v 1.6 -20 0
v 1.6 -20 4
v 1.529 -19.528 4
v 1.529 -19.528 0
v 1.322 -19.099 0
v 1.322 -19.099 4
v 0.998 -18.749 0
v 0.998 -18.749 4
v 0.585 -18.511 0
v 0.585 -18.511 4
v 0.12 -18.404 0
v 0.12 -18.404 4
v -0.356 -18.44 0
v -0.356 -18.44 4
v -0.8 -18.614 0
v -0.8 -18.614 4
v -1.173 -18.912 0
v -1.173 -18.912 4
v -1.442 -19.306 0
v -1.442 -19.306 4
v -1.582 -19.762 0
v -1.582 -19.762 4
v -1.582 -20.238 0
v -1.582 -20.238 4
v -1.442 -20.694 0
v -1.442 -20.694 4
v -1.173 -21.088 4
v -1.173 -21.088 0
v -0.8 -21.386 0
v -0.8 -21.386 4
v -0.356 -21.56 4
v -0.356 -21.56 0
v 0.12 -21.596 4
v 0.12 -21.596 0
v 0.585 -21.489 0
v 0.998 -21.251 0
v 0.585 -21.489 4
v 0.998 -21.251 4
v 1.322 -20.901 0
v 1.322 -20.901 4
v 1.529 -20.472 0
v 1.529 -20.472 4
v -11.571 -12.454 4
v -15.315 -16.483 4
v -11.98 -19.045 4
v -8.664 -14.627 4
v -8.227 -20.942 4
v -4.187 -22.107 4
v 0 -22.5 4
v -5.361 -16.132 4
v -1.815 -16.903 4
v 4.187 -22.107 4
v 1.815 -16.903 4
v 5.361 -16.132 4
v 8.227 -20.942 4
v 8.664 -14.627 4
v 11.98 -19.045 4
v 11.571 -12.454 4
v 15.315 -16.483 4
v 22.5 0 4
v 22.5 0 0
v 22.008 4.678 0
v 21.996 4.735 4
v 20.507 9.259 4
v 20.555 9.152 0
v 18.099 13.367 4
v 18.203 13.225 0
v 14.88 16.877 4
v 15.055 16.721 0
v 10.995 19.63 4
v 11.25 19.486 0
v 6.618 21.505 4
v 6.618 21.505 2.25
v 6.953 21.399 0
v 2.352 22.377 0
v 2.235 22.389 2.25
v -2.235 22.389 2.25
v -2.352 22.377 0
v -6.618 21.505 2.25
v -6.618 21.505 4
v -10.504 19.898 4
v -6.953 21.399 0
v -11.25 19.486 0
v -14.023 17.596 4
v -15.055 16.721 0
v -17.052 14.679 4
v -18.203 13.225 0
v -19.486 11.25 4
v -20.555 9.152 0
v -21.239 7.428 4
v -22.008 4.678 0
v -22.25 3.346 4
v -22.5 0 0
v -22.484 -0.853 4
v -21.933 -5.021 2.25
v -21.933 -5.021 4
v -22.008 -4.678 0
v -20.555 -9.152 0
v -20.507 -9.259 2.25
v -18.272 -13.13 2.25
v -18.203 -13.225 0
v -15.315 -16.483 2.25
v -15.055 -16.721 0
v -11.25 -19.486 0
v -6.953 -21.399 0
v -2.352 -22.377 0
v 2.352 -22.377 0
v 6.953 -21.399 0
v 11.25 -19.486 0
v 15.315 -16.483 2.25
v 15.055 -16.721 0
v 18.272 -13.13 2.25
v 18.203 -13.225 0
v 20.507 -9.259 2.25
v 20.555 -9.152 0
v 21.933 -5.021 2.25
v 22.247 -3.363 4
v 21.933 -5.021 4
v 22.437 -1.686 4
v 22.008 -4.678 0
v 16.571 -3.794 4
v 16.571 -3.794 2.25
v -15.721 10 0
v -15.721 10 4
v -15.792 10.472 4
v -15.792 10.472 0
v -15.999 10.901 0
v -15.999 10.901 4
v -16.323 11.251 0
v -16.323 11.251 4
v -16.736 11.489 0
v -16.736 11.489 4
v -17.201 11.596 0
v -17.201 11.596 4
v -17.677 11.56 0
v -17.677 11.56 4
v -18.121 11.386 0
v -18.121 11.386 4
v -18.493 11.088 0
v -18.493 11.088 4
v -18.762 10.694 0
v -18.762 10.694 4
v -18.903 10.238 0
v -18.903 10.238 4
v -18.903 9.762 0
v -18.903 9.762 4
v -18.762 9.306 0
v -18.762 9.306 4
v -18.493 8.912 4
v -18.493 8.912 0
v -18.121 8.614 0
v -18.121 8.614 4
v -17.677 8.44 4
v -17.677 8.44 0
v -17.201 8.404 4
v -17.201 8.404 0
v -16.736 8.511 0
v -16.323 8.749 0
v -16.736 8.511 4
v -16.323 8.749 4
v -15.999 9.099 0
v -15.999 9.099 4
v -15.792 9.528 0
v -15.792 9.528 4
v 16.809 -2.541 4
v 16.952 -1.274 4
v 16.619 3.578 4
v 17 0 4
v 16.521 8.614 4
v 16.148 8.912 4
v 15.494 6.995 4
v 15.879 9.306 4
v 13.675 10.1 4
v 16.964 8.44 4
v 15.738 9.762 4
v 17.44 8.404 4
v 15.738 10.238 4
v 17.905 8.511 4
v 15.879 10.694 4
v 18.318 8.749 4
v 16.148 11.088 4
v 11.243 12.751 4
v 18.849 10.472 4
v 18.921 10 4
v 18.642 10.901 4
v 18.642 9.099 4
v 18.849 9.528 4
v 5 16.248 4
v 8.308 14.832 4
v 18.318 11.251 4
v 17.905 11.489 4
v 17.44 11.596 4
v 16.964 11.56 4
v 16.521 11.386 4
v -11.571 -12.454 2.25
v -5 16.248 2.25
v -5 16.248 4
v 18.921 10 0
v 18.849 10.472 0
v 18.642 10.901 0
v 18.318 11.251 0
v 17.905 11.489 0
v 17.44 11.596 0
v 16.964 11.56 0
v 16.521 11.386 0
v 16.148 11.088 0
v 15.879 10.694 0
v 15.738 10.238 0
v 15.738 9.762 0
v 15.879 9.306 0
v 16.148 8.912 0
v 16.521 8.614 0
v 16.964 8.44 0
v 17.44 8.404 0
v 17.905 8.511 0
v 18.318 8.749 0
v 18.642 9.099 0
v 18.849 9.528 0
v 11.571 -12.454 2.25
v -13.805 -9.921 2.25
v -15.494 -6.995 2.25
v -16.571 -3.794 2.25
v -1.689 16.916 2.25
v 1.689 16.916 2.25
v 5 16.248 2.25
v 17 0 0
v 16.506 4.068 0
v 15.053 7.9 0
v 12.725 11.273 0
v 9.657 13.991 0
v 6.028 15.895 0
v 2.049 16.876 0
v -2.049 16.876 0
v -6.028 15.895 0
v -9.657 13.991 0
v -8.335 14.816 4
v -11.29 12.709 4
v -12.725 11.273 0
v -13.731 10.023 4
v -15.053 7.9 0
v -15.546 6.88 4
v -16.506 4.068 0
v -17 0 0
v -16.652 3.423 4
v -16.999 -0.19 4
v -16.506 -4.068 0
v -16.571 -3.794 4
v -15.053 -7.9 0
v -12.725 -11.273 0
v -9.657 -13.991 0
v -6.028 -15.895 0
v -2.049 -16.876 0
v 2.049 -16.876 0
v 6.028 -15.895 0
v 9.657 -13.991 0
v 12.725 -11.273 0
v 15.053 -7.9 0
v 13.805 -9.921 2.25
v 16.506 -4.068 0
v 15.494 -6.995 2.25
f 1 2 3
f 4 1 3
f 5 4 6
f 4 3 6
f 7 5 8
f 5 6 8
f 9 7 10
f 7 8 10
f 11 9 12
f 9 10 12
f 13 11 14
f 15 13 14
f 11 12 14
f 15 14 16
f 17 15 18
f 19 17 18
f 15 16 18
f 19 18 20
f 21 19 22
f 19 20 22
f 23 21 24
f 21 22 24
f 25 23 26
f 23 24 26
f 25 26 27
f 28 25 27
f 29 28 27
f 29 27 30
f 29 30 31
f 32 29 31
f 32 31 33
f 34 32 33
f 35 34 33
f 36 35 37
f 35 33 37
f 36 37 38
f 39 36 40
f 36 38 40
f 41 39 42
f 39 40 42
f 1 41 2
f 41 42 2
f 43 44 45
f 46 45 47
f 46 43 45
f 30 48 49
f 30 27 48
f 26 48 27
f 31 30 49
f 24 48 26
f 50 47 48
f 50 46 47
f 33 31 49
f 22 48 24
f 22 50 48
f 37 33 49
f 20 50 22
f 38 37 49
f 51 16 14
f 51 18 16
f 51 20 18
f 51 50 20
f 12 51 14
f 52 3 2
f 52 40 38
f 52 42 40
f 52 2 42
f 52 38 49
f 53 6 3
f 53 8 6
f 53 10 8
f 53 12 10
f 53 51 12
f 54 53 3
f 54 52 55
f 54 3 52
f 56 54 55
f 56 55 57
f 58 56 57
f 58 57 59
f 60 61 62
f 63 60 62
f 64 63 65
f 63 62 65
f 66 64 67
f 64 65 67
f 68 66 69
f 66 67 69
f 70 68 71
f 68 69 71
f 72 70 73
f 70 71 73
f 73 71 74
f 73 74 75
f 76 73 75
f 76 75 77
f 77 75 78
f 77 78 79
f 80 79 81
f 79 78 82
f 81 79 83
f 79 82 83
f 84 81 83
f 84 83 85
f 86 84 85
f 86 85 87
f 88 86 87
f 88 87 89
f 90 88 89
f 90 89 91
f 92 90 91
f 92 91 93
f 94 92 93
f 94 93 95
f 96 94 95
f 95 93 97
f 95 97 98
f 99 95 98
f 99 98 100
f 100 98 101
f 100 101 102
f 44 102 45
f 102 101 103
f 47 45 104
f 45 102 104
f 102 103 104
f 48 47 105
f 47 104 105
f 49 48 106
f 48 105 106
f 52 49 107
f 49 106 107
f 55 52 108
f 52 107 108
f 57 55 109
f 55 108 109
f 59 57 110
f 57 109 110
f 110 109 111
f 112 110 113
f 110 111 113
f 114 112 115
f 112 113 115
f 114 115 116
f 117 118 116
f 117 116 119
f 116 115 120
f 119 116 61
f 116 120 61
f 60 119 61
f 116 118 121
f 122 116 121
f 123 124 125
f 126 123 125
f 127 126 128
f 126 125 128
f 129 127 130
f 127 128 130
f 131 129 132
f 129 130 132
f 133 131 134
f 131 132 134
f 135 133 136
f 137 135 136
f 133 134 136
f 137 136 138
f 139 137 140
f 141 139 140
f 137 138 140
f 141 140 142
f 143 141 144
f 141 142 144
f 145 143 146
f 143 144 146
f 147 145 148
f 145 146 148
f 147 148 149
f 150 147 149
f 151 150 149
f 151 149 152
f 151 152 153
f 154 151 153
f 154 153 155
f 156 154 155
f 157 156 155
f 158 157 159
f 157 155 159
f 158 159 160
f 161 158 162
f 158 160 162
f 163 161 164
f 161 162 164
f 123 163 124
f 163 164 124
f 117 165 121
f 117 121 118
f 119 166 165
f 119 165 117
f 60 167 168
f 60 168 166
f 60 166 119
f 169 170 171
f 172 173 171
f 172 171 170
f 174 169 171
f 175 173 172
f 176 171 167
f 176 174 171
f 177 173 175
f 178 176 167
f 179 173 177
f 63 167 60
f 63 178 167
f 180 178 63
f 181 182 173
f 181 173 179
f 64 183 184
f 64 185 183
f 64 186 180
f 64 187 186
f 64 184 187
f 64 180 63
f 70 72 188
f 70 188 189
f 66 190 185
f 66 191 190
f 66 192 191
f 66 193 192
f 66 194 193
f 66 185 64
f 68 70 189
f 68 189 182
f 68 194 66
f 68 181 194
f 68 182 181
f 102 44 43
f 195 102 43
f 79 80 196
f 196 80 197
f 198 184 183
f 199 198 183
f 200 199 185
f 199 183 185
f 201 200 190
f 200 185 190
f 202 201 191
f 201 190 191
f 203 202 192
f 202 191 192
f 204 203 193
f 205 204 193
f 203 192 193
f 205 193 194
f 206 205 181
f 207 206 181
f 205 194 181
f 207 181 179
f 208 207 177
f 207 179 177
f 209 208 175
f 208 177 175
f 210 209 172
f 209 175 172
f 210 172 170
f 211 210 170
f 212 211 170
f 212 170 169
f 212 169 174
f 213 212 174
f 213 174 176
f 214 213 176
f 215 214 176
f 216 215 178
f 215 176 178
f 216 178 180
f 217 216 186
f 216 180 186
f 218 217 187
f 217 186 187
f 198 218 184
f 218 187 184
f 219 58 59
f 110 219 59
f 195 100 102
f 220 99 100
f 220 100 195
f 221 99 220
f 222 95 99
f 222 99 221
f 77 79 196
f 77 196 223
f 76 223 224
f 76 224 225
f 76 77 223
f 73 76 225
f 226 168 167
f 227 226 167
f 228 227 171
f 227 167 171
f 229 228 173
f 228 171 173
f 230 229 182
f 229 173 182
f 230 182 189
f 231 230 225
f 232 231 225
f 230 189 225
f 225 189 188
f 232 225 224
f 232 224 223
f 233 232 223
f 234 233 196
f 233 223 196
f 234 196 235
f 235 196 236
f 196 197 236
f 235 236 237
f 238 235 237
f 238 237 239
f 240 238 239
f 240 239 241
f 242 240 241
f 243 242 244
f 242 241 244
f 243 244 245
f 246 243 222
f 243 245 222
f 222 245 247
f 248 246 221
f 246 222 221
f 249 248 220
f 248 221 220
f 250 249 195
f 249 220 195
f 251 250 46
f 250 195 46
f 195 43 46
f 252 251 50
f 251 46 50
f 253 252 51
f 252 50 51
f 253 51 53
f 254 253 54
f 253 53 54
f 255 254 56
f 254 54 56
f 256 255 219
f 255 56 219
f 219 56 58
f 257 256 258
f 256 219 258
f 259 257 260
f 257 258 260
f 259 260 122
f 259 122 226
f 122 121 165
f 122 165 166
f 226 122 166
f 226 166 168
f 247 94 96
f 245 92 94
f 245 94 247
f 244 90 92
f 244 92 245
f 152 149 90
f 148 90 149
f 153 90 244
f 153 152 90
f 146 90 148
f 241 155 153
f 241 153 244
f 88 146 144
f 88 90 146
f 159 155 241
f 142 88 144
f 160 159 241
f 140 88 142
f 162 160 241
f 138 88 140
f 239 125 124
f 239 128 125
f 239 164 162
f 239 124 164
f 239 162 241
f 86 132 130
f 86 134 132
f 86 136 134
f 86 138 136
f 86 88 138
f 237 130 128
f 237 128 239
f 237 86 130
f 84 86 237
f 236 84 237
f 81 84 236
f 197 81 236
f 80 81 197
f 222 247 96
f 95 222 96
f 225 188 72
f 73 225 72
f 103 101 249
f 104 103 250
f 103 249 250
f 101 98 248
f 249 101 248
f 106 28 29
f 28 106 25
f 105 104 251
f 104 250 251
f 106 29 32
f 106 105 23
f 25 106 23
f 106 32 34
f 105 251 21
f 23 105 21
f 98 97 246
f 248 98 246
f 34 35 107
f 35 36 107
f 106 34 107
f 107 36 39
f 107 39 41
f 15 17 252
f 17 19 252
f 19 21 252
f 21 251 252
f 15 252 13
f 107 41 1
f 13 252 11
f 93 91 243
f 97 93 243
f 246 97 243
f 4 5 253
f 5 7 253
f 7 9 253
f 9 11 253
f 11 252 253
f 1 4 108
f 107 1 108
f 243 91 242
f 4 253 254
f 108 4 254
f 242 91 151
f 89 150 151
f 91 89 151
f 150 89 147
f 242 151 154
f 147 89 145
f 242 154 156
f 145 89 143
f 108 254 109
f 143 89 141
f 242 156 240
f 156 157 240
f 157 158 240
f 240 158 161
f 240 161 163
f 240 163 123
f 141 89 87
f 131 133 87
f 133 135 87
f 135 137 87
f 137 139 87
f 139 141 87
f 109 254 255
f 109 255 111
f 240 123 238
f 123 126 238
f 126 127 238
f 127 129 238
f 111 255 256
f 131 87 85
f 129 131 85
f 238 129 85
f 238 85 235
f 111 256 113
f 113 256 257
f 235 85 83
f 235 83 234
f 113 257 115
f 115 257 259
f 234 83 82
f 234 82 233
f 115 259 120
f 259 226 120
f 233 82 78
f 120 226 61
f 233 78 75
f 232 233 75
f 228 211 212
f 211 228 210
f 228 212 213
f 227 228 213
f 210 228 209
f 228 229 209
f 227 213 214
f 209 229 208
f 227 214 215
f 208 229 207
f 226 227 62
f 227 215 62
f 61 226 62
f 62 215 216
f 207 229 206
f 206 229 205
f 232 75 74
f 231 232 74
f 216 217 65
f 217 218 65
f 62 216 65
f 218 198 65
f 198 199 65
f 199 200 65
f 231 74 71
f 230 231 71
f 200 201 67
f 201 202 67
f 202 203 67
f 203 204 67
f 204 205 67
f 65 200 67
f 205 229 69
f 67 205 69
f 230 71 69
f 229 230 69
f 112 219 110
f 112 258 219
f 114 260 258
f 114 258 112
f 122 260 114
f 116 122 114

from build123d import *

# Parameters (mm, degrees)
F0_R     = 22.5
F1_DEPTH = 4
F2_R     = 17
F3_DEPTH = 4
F5_DEPTH = 1.75
F6_R     = 1.6
F7_DEPTH = 4


with BuildPart() as f1:
    # F0 (on Top) → F1 (new body)
    with BuildSketch(Plane.XY):
        Circle(F0_R)
    extrude(amount=F1_DEPTH)

    # F2 (on face) → F3 (cut)
    with BuildSketch(Plane.XY.offset(4)):
        Circle(F2_R)
    extrude(amount=-F3_DEPTH, mode=Mode.SUBTRACT)

    # F4 (on face) → F5 (cut)
    with BuildSketch(Plane.XY.offset(4)):
        with BuildLine():
            Line((-6.6176470588, 21.5048075417), (-5, 16.2480768093))
            ThreePointArc((-5, 16.2480768093), (0, 17), (5, 16.2480768093))
            Line((5, 16.2480768093), (6.6176470588, 21.5048075417))
            ThreePointArc((6.6176470588, 21.5048075417), (0, 22.5), (-6.6176470588, 21.5048075417))
        make_face()
        with BuildLine():
            Line((-16.5712472795, -3.7939113857), (-21.932533164, -5.0213533046))
            ThreePointArc((-21.932533164, -5.0213533046), (-19.4855715851, -11.25), (-15.3148861052, -16.4834542371))
            Line((-15.3148861052, -16.4834542371), (-11.5712472795, -12.4541654236))
            ThreePointArc((-11.5712472795, -12.4541654236), (-14.7224318643, -8.5), (-16.5712472795, -3.7939113857))
        make_face()
        with BuildLine():
            Line((11.5712472795, -12.4541654236), (15.3148861052, -16.4834542371))
            ThreePointArc((15.3148861052, -16.4834542371), (19.4855715851, -11.25), (21.932533164, -5.0213533046))
            Line((21.932533164, -5.0213533046), (16.5712472795, -3.7939113857))
            ThreePointArc((16.5712472795, -3.7939113857), (14.7224318643, -8.5), (11.5712472795, -12.4541654236))
        make_face()
    extrude(amount=-F5_DEPTH, mode=Mode.SUBTRACT)

    # F6 (on face) → F7 (cut)
    with BuildSketch(Plane.XY.offset(4)):
        with Locations((0, -20)):
            Circle(F6_R)
        with Locations((17.3205080757, 10)):
            Circle(F6_R)
        with Locations((-17.3205080757, 10)):
            Circle(F6_R)
    extrude(amount=-F7_DEPTH, mode=Mode.SUBTRACT)


solid = f1.part
